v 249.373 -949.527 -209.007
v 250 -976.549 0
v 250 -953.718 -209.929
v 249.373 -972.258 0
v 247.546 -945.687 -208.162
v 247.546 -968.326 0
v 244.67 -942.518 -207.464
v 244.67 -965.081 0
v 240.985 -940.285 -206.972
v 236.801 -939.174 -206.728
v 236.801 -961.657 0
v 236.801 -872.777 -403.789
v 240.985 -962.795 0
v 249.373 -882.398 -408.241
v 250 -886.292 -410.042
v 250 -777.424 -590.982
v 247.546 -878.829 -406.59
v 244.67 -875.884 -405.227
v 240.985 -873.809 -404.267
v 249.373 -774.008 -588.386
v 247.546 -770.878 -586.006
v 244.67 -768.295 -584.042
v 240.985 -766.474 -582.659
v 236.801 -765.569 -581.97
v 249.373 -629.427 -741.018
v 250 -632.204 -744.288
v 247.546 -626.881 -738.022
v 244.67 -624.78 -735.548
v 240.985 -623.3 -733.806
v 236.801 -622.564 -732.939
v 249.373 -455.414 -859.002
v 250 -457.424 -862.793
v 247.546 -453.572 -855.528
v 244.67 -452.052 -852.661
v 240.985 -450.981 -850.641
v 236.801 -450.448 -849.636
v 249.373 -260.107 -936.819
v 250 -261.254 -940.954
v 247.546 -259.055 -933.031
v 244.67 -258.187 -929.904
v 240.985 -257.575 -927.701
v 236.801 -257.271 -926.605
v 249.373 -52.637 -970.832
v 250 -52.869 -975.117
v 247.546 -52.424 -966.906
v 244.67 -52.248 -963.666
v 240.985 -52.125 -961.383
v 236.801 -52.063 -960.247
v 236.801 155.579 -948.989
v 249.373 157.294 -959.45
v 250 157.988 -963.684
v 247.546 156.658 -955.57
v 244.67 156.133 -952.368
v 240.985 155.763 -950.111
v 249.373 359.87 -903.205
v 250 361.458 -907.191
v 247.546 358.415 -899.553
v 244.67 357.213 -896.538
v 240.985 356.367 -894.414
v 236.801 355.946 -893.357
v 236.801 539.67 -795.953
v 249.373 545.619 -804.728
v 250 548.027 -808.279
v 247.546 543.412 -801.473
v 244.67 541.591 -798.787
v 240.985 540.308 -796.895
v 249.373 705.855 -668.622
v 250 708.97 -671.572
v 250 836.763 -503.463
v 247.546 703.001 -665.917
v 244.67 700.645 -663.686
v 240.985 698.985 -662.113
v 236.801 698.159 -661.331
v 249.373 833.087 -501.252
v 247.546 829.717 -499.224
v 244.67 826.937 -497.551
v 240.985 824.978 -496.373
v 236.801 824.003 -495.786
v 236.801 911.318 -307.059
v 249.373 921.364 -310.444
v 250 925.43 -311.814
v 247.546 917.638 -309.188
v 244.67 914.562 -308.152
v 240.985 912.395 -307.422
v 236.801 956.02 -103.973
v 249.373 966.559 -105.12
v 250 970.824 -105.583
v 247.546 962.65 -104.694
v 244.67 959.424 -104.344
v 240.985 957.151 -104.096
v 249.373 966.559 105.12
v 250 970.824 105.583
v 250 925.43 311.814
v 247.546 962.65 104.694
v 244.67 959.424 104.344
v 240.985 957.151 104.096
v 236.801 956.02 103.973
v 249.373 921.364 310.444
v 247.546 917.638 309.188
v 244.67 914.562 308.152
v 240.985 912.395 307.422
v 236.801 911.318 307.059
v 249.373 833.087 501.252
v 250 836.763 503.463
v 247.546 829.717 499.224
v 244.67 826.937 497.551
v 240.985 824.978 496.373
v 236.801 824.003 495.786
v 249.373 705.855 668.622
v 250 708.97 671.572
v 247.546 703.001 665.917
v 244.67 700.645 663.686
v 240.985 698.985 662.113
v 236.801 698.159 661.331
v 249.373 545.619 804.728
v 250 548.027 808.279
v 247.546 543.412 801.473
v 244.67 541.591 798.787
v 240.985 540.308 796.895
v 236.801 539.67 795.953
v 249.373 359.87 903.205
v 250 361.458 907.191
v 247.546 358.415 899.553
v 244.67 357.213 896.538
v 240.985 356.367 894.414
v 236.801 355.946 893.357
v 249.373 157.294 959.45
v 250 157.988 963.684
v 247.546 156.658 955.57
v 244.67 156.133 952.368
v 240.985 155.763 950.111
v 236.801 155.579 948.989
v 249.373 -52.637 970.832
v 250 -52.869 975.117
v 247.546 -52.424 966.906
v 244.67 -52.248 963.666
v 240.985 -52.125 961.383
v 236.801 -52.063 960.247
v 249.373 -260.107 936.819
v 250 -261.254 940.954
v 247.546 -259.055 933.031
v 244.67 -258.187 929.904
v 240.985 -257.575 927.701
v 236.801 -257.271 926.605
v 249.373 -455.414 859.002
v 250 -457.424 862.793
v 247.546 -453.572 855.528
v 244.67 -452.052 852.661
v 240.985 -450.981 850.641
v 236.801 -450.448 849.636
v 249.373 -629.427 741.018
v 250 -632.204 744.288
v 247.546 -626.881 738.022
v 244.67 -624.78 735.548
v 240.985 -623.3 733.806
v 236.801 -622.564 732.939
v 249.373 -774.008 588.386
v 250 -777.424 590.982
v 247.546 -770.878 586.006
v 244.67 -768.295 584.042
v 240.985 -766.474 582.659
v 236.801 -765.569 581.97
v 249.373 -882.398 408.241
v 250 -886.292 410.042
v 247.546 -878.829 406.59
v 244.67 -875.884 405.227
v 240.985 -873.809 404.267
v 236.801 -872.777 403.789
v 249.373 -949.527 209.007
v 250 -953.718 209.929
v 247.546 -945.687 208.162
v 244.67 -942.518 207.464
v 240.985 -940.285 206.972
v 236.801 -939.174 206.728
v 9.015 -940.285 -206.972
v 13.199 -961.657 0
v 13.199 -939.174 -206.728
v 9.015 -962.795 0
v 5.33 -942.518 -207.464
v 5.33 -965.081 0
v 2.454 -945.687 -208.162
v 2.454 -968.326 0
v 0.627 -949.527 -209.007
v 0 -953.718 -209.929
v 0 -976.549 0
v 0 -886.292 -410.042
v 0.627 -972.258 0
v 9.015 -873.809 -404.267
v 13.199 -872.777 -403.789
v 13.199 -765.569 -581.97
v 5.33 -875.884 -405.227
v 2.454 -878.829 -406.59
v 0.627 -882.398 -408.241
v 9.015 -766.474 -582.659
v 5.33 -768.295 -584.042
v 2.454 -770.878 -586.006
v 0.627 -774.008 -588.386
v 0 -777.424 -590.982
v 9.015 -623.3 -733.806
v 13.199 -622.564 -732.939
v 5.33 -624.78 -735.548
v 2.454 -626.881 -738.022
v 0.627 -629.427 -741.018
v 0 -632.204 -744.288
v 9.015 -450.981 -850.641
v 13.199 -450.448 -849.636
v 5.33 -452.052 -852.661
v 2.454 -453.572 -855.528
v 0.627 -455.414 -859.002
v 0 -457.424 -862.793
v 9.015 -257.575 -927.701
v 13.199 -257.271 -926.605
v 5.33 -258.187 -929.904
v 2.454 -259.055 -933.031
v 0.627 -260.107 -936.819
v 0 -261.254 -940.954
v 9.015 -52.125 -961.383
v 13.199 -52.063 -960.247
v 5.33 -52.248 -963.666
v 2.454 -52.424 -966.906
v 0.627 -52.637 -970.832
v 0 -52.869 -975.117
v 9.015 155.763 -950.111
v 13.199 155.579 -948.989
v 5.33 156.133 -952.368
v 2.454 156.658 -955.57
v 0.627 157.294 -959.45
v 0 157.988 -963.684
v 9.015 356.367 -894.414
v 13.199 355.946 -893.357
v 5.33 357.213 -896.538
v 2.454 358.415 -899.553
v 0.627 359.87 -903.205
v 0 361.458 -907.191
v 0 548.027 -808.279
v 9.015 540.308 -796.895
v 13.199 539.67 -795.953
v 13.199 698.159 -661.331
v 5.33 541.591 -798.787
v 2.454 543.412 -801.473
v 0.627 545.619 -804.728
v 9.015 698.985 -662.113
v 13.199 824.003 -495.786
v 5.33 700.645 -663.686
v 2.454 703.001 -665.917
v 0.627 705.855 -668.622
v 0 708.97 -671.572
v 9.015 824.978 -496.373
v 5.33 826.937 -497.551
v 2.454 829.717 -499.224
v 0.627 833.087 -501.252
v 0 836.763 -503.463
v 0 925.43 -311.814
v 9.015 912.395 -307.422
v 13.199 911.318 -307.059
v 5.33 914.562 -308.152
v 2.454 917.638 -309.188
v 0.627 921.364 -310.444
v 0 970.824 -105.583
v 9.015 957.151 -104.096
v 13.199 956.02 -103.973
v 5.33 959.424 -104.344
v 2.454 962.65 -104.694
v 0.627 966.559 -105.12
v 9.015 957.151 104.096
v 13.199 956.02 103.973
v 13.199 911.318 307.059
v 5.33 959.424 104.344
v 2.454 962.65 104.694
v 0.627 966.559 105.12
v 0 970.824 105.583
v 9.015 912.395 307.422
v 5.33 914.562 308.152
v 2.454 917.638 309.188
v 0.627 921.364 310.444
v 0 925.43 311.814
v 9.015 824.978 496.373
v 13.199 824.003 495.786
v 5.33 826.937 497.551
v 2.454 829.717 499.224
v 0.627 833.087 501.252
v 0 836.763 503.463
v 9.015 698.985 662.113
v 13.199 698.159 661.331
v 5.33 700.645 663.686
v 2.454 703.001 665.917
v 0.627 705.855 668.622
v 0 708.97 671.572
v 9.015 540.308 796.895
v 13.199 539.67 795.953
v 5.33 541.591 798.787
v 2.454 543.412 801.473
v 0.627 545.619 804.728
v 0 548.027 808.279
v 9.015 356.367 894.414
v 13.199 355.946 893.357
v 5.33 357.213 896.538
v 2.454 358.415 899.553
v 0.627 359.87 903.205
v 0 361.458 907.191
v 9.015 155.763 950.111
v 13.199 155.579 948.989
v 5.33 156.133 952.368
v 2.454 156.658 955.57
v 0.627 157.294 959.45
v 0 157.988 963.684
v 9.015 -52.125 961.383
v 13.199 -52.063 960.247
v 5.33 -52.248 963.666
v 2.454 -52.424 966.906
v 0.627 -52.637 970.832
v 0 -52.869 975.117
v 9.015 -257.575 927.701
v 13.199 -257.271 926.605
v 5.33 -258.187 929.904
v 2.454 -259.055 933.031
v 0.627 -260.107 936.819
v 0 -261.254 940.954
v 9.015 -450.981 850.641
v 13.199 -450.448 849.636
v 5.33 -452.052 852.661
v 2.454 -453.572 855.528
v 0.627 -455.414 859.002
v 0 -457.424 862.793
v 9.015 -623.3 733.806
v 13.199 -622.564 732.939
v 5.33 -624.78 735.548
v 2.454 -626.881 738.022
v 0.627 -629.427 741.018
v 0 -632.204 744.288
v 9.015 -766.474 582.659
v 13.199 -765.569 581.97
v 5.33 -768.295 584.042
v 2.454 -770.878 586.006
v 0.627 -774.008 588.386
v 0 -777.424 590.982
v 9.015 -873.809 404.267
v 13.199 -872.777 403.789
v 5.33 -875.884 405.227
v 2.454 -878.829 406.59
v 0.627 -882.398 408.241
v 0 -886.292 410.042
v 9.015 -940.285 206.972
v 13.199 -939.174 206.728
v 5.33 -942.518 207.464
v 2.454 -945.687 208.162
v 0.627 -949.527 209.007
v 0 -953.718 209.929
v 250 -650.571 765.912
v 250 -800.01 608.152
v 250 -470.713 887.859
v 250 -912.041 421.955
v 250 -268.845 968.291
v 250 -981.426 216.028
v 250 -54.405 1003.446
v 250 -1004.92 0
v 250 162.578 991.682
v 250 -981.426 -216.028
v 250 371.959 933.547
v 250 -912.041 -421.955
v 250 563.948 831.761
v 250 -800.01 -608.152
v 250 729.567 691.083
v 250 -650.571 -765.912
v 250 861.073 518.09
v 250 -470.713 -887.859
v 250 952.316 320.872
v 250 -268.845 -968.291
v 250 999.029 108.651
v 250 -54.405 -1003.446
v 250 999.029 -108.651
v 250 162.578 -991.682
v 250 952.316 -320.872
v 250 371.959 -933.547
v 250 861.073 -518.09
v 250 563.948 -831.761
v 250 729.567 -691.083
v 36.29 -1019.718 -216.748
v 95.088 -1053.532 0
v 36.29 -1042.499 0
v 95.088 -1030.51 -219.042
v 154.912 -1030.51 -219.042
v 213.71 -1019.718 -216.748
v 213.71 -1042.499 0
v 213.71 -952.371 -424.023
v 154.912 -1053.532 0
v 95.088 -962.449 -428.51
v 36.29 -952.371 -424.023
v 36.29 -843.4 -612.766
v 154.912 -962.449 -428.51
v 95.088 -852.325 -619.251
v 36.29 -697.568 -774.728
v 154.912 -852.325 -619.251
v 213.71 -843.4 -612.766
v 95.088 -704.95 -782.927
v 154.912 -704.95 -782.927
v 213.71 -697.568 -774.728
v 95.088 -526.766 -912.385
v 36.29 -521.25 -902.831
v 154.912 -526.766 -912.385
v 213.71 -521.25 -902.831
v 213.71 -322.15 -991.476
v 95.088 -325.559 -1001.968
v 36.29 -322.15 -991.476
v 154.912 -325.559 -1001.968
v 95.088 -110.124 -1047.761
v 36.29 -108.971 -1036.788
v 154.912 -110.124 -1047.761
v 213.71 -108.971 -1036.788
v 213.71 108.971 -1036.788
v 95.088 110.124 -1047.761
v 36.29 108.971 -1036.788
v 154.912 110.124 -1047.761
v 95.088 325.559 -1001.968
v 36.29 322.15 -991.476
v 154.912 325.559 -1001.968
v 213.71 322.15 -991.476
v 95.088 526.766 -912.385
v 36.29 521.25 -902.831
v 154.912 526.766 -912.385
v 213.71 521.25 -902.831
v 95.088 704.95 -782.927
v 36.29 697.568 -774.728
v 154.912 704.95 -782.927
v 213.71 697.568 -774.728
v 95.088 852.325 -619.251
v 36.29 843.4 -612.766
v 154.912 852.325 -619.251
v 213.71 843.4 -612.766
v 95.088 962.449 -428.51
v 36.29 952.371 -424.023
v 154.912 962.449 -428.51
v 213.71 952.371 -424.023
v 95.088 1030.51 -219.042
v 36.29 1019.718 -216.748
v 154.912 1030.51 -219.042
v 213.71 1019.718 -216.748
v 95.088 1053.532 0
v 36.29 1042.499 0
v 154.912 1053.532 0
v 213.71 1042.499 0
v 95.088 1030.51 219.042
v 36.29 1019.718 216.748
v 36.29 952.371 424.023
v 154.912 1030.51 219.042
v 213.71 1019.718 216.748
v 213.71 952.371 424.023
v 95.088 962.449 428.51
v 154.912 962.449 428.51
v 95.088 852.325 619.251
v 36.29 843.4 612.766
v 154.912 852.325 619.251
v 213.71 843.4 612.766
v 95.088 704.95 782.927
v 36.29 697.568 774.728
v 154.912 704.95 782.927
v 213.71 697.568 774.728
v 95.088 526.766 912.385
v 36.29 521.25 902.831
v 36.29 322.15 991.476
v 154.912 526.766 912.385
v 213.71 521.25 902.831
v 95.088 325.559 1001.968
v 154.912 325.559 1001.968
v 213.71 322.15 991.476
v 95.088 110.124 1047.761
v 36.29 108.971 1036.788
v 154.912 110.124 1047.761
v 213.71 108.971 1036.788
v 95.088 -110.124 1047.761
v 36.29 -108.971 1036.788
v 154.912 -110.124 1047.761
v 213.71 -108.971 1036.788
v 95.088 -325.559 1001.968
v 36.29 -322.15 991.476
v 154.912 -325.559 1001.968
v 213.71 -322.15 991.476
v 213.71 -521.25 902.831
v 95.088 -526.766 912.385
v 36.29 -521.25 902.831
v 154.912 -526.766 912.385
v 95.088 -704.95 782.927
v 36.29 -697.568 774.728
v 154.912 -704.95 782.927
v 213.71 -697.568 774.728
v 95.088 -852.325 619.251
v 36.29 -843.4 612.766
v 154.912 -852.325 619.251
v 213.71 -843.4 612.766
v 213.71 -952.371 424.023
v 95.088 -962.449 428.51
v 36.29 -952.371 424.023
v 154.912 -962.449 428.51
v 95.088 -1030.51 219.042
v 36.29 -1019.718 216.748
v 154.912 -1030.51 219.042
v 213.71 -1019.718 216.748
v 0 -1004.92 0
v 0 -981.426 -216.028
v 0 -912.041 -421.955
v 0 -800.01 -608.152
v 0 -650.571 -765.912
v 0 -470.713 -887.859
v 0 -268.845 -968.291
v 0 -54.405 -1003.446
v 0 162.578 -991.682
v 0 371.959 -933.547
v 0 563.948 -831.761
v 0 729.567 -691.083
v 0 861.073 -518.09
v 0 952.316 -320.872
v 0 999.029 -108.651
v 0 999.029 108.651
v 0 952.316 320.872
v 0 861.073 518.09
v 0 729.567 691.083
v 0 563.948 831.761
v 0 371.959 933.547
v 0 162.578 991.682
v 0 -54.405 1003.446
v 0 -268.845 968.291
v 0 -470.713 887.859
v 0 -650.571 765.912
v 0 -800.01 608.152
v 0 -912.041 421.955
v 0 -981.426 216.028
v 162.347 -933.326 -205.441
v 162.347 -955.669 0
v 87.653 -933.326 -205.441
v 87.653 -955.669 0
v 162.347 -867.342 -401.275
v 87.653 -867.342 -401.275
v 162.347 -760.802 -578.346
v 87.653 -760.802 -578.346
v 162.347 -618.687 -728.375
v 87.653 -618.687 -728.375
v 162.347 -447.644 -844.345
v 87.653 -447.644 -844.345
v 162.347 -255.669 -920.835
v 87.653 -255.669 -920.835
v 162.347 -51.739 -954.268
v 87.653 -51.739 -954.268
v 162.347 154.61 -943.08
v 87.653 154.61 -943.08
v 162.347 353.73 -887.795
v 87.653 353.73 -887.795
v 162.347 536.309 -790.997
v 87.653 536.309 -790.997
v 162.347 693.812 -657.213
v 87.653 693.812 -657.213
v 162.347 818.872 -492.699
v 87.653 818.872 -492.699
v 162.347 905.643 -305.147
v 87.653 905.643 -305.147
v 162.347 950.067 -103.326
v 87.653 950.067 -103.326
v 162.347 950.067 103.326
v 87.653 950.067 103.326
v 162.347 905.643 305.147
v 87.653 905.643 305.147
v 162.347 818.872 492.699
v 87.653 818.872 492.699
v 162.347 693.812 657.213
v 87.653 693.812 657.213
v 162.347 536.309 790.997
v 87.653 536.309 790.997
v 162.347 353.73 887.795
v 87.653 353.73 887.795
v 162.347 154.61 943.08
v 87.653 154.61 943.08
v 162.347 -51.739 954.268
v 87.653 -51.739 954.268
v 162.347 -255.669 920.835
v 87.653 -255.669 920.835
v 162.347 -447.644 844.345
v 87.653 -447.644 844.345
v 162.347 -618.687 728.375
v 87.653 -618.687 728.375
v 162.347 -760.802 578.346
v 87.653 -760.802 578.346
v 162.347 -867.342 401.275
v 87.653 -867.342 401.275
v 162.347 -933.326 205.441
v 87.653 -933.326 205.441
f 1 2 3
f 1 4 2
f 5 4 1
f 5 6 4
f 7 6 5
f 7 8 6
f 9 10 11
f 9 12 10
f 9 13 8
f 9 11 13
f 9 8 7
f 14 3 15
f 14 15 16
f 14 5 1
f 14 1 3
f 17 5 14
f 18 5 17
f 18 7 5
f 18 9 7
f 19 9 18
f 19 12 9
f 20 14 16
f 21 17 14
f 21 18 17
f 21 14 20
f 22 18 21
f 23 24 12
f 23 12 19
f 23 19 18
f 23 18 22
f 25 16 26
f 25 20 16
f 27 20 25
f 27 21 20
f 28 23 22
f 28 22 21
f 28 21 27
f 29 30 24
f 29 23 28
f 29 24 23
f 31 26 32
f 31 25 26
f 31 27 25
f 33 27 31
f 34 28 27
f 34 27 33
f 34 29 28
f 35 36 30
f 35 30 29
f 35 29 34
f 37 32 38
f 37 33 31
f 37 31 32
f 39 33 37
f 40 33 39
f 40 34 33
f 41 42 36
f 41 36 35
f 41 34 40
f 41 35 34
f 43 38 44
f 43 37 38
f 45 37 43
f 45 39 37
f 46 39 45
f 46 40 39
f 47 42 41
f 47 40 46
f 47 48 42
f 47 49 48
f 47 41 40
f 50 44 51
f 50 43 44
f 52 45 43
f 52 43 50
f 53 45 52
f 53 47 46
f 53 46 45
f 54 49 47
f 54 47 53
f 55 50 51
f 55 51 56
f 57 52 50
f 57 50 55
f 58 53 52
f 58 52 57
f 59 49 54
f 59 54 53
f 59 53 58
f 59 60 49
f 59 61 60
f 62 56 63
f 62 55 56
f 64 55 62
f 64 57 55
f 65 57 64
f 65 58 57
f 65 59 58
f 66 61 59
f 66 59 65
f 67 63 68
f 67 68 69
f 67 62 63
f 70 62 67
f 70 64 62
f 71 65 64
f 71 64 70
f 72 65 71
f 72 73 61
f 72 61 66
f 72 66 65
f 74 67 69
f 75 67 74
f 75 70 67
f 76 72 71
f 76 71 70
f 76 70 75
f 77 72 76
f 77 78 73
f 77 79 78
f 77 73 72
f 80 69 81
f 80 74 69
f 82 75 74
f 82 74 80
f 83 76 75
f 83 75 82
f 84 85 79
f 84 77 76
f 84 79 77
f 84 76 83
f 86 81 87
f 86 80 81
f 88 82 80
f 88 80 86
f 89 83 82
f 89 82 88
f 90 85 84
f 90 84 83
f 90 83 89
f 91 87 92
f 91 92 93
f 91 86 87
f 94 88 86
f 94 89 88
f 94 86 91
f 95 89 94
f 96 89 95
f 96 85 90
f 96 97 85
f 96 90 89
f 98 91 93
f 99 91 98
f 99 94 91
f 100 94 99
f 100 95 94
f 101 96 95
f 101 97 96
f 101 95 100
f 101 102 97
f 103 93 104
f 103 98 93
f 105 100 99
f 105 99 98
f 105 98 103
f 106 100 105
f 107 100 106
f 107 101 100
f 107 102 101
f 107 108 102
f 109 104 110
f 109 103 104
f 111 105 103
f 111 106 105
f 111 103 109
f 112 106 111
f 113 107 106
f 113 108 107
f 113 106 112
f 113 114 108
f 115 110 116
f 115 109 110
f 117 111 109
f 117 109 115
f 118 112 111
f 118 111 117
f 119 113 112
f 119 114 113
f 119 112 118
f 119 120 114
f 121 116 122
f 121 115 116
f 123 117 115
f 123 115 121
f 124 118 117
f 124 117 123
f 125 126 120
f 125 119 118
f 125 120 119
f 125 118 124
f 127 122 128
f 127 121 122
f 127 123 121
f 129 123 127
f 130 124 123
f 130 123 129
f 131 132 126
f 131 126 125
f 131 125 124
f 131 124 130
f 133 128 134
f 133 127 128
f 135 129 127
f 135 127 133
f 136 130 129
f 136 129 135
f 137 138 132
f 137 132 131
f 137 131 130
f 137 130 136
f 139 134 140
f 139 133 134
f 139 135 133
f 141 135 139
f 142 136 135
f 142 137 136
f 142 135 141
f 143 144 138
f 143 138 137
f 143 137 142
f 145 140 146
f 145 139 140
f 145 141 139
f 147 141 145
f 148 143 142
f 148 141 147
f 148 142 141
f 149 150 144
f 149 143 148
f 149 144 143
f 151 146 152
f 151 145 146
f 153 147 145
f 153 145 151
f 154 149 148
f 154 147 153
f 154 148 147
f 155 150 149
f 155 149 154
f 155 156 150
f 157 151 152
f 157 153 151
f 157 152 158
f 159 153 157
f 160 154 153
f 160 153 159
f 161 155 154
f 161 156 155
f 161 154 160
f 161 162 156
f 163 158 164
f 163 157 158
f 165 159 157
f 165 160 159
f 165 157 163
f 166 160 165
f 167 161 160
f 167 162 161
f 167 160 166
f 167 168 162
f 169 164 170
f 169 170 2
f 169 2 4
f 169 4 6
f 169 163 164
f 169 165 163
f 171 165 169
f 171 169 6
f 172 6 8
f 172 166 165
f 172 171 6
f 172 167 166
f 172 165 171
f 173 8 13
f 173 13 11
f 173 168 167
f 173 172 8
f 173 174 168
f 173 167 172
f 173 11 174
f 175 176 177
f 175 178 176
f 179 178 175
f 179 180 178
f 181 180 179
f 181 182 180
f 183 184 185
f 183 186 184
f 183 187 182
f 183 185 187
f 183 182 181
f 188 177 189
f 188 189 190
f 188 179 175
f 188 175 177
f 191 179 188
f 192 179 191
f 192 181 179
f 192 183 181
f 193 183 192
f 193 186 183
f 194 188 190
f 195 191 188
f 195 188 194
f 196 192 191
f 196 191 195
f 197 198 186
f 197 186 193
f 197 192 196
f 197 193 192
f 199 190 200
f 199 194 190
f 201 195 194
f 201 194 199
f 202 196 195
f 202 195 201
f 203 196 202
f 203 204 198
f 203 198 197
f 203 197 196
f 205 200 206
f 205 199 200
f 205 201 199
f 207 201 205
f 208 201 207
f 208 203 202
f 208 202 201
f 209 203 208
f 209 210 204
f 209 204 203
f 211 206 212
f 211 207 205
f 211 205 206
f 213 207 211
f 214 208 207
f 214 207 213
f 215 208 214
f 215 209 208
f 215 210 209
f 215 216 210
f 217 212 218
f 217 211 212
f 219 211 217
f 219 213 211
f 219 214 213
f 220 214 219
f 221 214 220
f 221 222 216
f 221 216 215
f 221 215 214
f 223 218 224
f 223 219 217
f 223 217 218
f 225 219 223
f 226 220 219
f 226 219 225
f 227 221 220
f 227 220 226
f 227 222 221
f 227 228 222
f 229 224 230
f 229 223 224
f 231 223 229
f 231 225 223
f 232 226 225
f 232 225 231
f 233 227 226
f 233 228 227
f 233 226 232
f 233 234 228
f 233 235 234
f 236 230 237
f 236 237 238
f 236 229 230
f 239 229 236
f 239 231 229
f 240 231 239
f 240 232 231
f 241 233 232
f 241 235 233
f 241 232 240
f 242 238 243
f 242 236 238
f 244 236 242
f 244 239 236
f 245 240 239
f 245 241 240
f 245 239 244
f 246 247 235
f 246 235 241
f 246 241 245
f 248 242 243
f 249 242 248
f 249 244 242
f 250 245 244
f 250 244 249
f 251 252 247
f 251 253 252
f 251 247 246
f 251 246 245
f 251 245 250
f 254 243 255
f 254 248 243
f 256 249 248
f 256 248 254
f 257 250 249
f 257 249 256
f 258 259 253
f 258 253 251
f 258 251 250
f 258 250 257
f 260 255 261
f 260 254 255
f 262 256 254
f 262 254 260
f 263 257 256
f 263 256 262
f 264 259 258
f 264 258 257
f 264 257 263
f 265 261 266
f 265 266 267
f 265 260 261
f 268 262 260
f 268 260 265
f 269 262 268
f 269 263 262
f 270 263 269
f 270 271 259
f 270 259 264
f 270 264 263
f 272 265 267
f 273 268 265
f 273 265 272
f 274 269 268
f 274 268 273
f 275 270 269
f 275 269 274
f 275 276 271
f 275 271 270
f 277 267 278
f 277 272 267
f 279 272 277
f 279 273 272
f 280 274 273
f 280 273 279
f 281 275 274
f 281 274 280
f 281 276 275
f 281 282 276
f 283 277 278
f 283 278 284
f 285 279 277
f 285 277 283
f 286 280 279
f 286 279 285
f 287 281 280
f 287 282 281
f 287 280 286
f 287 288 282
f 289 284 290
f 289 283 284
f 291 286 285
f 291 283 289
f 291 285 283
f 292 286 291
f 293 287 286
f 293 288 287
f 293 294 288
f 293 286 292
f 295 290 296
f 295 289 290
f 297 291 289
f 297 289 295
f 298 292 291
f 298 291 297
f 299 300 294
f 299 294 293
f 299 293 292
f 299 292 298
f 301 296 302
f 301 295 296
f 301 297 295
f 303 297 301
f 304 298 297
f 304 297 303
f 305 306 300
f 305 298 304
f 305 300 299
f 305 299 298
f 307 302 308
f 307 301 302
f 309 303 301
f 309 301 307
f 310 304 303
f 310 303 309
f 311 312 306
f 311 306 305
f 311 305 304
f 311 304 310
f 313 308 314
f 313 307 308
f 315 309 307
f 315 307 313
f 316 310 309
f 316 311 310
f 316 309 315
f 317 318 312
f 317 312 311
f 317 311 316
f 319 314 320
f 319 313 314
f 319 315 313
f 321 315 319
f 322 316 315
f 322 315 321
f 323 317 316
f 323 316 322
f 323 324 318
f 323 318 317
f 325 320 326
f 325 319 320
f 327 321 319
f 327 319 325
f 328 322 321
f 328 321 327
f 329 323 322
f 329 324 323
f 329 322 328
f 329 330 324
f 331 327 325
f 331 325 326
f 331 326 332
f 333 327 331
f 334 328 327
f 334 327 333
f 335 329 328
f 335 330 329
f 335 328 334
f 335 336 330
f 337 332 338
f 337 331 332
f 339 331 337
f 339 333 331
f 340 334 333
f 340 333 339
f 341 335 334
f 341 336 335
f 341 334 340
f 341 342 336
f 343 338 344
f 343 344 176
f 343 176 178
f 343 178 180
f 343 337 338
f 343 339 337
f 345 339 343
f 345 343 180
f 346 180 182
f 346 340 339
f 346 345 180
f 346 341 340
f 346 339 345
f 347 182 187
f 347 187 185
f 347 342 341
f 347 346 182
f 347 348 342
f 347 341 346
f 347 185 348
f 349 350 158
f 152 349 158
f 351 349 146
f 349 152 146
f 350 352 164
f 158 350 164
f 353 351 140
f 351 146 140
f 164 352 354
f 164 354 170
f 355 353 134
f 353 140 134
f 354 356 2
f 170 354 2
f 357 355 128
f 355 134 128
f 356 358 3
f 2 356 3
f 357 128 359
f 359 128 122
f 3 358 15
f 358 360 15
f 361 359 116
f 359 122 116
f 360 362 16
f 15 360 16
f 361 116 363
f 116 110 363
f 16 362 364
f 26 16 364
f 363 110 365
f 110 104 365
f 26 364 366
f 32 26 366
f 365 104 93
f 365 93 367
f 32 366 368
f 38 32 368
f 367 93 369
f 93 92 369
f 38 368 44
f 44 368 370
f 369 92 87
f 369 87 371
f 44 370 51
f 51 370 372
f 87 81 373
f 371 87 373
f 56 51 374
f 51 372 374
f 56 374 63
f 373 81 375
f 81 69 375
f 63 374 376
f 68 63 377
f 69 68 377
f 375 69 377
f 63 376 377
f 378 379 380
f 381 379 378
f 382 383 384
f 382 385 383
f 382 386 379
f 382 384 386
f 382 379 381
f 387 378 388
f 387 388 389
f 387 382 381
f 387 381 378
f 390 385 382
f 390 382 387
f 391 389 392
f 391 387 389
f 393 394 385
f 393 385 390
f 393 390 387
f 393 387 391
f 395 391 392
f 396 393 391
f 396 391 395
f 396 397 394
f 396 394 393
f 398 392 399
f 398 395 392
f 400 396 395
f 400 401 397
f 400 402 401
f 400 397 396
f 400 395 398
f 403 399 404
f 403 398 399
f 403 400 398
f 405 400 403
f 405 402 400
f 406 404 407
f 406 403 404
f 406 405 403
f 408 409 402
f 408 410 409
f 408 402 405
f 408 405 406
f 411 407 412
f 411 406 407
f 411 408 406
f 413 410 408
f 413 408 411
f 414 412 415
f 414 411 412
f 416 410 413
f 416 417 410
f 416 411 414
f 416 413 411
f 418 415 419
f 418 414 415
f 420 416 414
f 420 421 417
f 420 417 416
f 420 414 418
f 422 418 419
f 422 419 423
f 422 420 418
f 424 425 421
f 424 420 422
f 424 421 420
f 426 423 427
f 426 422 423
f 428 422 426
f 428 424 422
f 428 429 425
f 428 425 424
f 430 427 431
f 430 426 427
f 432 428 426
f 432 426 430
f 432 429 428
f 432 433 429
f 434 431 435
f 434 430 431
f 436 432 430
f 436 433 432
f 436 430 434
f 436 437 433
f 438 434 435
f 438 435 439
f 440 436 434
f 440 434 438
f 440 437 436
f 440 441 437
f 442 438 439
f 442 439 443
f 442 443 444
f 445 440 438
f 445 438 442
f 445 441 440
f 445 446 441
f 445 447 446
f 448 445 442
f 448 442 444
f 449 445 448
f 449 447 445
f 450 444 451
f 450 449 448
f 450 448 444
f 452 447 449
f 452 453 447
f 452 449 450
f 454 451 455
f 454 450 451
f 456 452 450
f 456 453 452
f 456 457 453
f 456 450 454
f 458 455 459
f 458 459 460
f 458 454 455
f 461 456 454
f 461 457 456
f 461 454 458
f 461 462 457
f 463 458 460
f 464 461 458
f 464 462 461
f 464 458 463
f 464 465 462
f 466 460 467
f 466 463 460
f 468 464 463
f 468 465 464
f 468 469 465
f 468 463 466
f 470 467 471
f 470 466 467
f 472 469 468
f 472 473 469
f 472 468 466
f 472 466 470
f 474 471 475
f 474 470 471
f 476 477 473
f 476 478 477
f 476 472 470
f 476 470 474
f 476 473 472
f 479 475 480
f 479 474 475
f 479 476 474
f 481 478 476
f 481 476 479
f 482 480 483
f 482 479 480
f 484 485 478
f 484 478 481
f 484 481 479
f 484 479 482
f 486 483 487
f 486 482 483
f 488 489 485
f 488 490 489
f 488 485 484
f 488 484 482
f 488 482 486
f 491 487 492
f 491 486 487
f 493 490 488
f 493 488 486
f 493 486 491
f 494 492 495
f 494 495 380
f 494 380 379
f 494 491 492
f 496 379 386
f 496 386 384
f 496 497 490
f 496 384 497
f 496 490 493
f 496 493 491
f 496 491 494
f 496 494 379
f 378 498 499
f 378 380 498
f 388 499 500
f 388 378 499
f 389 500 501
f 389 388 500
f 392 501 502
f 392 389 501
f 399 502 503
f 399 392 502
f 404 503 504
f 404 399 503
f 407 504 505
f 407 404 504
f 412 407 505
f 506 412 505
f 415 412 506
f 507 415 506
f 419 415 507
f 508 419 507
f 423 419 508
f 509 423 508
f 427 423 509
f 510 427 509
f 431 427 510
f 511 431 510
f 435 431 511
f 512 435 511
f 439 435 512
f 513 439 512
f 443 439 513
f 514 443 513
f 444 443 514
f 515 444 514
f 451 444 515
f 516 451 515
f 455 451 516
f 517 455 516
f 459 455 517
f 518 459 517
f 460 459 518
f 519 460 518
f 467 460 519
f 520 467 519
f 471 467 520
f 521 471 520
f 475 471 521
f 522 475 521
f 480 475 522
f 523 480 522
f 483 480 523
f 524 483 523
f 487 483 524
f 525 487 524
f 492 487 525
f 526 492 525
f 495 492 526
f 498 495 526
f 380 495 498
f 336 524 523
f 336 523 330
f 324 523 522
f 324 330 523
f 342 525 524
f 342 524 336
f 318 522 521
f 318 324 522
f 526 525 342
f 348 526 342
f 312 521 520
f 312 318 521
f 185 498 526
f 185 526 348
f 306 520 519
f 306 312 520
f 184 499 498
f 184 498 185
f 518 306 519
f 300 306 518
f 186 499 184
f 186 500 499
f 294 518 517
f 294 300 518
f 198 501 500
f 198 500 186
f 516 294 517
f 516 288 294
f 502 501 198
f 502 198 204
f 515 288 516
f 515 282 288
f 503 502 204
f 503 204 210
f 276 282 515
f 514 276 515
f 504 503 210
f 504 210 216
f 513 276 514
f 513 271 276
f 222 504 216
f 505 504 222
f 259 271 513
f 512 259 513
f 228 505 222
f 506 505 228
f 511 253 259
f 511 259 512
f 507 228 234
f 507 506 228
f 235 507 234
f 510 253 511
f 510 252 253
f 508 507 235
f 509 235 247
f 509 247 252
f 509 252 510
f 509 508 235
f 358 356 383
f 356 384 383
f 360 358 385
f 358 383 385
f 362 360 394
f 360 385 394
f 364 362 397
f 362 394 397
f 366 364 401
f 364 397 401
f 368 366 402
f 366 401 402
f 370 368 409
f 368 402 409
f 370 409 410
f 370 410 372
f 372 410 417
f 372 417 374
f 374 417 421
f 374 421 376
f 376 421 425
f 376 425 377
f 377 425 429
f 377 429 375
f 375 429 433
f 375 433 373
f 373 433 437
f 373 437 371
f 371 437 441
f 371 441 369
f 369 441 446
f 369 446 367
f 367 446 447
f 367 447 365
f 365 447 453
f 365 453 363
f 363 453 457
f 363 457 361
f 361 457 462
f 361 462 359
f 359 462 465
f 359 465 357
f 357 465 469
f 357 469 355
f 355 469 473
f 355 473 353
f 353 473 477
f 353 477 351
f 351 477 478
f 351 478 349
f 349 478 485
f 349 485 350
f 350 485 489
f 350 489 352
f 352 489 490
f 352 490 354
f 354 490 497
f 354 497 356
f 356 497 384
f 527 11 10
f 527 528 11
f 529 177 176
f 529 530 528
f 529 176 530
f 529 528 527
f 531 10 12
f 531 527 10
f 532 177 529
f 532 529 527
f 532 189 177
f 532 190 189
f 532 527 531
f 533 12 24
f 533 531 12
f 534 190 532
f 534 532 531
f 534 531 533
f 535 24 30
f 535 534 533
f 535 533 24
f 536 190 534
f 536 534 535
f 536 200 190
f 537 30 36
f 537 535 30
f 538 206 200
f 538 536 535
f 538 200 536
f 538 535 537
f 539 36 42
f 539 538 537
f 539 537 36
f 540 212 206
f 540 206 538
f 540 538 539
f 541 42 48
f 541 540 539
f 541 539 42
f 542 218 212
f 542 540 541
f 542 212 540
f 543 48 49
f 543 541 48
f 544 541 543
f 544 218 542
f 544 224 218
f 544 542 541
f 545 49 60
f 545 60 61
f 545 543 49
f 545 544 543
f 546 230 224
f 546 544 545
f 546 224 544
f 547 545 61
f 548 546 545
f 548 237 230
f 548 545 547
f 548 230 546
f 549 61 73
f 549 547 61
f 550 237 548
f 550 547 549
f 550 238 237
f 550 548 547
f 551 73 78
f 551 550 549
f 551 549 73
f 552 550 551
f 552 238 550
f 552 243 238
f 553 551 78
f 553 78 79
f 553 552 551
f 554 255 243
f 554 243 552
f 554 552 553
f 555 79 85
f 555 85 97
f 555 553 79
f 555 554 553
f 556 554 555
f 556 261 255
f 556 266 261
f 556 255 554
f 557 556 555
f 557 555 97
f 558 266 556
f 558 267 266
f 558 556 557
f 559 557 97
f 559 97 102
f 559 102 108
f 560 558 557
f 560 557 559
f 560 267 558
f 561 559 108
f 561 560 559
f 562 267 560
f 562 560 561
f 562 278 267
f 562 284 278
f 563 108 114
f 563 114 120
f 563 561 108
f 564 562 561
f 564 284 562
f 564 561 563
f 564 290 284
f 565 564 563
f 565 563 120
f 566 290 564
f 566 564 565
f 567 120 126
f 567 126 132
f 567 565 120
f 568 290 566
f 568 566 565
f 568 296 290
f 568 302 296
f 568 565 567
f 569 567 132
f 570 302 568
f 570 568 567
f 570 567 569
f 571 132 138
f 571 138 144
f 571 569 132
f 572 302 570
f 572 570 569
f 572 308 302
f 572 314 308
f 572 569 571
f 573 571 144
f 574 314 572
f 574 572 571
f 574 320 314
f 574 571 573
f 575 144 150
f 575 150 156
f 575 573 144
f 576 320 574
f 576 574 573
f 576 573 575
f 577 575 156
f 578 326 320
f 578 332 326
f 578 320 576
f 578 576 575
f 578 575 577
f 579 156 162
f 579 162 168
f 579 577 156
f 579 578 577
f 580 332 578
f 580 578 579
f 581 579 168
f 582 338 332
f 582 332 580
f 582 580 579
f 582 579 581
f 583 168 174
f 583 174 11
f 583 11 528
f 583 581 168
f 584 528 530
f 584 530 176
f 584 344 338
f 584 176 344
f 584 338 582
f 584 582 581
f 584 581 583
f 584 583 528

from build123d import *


with BuildPart() as part:
    # Sketch → Revolution (revolve)
    with BuildSketch(Plane.XY):
        with BuildLine():
            Line((250, -976.548789), (250, -1004.92))
            Line((250, -1004.92), (213.710075, -1042.499334))
            ThreePointArc((36.289925, -1042.499334), (125, -1054.92), (213.710075, -1042.499334))
            Line((0, -1004.92), (36.289925, -1042.499334))
            Line((0, -976.548789), (0, -1004.92))
            ThreePointArc((13.19869, -961.657339), (3.77459, -966.599408), (0, -976.548789))
            ThreePointArc((236.80131, -961.657339), (125, -954.92), (13.19869, -961.657339))
            ThreePointArc((250, -976.548789), (246.22541, -966.599408), (236.80131, -961.657339))
        make_face()
    revolve(axis=Axis((0, 0, 0), (1, 0, 0)))


solid = part.part
